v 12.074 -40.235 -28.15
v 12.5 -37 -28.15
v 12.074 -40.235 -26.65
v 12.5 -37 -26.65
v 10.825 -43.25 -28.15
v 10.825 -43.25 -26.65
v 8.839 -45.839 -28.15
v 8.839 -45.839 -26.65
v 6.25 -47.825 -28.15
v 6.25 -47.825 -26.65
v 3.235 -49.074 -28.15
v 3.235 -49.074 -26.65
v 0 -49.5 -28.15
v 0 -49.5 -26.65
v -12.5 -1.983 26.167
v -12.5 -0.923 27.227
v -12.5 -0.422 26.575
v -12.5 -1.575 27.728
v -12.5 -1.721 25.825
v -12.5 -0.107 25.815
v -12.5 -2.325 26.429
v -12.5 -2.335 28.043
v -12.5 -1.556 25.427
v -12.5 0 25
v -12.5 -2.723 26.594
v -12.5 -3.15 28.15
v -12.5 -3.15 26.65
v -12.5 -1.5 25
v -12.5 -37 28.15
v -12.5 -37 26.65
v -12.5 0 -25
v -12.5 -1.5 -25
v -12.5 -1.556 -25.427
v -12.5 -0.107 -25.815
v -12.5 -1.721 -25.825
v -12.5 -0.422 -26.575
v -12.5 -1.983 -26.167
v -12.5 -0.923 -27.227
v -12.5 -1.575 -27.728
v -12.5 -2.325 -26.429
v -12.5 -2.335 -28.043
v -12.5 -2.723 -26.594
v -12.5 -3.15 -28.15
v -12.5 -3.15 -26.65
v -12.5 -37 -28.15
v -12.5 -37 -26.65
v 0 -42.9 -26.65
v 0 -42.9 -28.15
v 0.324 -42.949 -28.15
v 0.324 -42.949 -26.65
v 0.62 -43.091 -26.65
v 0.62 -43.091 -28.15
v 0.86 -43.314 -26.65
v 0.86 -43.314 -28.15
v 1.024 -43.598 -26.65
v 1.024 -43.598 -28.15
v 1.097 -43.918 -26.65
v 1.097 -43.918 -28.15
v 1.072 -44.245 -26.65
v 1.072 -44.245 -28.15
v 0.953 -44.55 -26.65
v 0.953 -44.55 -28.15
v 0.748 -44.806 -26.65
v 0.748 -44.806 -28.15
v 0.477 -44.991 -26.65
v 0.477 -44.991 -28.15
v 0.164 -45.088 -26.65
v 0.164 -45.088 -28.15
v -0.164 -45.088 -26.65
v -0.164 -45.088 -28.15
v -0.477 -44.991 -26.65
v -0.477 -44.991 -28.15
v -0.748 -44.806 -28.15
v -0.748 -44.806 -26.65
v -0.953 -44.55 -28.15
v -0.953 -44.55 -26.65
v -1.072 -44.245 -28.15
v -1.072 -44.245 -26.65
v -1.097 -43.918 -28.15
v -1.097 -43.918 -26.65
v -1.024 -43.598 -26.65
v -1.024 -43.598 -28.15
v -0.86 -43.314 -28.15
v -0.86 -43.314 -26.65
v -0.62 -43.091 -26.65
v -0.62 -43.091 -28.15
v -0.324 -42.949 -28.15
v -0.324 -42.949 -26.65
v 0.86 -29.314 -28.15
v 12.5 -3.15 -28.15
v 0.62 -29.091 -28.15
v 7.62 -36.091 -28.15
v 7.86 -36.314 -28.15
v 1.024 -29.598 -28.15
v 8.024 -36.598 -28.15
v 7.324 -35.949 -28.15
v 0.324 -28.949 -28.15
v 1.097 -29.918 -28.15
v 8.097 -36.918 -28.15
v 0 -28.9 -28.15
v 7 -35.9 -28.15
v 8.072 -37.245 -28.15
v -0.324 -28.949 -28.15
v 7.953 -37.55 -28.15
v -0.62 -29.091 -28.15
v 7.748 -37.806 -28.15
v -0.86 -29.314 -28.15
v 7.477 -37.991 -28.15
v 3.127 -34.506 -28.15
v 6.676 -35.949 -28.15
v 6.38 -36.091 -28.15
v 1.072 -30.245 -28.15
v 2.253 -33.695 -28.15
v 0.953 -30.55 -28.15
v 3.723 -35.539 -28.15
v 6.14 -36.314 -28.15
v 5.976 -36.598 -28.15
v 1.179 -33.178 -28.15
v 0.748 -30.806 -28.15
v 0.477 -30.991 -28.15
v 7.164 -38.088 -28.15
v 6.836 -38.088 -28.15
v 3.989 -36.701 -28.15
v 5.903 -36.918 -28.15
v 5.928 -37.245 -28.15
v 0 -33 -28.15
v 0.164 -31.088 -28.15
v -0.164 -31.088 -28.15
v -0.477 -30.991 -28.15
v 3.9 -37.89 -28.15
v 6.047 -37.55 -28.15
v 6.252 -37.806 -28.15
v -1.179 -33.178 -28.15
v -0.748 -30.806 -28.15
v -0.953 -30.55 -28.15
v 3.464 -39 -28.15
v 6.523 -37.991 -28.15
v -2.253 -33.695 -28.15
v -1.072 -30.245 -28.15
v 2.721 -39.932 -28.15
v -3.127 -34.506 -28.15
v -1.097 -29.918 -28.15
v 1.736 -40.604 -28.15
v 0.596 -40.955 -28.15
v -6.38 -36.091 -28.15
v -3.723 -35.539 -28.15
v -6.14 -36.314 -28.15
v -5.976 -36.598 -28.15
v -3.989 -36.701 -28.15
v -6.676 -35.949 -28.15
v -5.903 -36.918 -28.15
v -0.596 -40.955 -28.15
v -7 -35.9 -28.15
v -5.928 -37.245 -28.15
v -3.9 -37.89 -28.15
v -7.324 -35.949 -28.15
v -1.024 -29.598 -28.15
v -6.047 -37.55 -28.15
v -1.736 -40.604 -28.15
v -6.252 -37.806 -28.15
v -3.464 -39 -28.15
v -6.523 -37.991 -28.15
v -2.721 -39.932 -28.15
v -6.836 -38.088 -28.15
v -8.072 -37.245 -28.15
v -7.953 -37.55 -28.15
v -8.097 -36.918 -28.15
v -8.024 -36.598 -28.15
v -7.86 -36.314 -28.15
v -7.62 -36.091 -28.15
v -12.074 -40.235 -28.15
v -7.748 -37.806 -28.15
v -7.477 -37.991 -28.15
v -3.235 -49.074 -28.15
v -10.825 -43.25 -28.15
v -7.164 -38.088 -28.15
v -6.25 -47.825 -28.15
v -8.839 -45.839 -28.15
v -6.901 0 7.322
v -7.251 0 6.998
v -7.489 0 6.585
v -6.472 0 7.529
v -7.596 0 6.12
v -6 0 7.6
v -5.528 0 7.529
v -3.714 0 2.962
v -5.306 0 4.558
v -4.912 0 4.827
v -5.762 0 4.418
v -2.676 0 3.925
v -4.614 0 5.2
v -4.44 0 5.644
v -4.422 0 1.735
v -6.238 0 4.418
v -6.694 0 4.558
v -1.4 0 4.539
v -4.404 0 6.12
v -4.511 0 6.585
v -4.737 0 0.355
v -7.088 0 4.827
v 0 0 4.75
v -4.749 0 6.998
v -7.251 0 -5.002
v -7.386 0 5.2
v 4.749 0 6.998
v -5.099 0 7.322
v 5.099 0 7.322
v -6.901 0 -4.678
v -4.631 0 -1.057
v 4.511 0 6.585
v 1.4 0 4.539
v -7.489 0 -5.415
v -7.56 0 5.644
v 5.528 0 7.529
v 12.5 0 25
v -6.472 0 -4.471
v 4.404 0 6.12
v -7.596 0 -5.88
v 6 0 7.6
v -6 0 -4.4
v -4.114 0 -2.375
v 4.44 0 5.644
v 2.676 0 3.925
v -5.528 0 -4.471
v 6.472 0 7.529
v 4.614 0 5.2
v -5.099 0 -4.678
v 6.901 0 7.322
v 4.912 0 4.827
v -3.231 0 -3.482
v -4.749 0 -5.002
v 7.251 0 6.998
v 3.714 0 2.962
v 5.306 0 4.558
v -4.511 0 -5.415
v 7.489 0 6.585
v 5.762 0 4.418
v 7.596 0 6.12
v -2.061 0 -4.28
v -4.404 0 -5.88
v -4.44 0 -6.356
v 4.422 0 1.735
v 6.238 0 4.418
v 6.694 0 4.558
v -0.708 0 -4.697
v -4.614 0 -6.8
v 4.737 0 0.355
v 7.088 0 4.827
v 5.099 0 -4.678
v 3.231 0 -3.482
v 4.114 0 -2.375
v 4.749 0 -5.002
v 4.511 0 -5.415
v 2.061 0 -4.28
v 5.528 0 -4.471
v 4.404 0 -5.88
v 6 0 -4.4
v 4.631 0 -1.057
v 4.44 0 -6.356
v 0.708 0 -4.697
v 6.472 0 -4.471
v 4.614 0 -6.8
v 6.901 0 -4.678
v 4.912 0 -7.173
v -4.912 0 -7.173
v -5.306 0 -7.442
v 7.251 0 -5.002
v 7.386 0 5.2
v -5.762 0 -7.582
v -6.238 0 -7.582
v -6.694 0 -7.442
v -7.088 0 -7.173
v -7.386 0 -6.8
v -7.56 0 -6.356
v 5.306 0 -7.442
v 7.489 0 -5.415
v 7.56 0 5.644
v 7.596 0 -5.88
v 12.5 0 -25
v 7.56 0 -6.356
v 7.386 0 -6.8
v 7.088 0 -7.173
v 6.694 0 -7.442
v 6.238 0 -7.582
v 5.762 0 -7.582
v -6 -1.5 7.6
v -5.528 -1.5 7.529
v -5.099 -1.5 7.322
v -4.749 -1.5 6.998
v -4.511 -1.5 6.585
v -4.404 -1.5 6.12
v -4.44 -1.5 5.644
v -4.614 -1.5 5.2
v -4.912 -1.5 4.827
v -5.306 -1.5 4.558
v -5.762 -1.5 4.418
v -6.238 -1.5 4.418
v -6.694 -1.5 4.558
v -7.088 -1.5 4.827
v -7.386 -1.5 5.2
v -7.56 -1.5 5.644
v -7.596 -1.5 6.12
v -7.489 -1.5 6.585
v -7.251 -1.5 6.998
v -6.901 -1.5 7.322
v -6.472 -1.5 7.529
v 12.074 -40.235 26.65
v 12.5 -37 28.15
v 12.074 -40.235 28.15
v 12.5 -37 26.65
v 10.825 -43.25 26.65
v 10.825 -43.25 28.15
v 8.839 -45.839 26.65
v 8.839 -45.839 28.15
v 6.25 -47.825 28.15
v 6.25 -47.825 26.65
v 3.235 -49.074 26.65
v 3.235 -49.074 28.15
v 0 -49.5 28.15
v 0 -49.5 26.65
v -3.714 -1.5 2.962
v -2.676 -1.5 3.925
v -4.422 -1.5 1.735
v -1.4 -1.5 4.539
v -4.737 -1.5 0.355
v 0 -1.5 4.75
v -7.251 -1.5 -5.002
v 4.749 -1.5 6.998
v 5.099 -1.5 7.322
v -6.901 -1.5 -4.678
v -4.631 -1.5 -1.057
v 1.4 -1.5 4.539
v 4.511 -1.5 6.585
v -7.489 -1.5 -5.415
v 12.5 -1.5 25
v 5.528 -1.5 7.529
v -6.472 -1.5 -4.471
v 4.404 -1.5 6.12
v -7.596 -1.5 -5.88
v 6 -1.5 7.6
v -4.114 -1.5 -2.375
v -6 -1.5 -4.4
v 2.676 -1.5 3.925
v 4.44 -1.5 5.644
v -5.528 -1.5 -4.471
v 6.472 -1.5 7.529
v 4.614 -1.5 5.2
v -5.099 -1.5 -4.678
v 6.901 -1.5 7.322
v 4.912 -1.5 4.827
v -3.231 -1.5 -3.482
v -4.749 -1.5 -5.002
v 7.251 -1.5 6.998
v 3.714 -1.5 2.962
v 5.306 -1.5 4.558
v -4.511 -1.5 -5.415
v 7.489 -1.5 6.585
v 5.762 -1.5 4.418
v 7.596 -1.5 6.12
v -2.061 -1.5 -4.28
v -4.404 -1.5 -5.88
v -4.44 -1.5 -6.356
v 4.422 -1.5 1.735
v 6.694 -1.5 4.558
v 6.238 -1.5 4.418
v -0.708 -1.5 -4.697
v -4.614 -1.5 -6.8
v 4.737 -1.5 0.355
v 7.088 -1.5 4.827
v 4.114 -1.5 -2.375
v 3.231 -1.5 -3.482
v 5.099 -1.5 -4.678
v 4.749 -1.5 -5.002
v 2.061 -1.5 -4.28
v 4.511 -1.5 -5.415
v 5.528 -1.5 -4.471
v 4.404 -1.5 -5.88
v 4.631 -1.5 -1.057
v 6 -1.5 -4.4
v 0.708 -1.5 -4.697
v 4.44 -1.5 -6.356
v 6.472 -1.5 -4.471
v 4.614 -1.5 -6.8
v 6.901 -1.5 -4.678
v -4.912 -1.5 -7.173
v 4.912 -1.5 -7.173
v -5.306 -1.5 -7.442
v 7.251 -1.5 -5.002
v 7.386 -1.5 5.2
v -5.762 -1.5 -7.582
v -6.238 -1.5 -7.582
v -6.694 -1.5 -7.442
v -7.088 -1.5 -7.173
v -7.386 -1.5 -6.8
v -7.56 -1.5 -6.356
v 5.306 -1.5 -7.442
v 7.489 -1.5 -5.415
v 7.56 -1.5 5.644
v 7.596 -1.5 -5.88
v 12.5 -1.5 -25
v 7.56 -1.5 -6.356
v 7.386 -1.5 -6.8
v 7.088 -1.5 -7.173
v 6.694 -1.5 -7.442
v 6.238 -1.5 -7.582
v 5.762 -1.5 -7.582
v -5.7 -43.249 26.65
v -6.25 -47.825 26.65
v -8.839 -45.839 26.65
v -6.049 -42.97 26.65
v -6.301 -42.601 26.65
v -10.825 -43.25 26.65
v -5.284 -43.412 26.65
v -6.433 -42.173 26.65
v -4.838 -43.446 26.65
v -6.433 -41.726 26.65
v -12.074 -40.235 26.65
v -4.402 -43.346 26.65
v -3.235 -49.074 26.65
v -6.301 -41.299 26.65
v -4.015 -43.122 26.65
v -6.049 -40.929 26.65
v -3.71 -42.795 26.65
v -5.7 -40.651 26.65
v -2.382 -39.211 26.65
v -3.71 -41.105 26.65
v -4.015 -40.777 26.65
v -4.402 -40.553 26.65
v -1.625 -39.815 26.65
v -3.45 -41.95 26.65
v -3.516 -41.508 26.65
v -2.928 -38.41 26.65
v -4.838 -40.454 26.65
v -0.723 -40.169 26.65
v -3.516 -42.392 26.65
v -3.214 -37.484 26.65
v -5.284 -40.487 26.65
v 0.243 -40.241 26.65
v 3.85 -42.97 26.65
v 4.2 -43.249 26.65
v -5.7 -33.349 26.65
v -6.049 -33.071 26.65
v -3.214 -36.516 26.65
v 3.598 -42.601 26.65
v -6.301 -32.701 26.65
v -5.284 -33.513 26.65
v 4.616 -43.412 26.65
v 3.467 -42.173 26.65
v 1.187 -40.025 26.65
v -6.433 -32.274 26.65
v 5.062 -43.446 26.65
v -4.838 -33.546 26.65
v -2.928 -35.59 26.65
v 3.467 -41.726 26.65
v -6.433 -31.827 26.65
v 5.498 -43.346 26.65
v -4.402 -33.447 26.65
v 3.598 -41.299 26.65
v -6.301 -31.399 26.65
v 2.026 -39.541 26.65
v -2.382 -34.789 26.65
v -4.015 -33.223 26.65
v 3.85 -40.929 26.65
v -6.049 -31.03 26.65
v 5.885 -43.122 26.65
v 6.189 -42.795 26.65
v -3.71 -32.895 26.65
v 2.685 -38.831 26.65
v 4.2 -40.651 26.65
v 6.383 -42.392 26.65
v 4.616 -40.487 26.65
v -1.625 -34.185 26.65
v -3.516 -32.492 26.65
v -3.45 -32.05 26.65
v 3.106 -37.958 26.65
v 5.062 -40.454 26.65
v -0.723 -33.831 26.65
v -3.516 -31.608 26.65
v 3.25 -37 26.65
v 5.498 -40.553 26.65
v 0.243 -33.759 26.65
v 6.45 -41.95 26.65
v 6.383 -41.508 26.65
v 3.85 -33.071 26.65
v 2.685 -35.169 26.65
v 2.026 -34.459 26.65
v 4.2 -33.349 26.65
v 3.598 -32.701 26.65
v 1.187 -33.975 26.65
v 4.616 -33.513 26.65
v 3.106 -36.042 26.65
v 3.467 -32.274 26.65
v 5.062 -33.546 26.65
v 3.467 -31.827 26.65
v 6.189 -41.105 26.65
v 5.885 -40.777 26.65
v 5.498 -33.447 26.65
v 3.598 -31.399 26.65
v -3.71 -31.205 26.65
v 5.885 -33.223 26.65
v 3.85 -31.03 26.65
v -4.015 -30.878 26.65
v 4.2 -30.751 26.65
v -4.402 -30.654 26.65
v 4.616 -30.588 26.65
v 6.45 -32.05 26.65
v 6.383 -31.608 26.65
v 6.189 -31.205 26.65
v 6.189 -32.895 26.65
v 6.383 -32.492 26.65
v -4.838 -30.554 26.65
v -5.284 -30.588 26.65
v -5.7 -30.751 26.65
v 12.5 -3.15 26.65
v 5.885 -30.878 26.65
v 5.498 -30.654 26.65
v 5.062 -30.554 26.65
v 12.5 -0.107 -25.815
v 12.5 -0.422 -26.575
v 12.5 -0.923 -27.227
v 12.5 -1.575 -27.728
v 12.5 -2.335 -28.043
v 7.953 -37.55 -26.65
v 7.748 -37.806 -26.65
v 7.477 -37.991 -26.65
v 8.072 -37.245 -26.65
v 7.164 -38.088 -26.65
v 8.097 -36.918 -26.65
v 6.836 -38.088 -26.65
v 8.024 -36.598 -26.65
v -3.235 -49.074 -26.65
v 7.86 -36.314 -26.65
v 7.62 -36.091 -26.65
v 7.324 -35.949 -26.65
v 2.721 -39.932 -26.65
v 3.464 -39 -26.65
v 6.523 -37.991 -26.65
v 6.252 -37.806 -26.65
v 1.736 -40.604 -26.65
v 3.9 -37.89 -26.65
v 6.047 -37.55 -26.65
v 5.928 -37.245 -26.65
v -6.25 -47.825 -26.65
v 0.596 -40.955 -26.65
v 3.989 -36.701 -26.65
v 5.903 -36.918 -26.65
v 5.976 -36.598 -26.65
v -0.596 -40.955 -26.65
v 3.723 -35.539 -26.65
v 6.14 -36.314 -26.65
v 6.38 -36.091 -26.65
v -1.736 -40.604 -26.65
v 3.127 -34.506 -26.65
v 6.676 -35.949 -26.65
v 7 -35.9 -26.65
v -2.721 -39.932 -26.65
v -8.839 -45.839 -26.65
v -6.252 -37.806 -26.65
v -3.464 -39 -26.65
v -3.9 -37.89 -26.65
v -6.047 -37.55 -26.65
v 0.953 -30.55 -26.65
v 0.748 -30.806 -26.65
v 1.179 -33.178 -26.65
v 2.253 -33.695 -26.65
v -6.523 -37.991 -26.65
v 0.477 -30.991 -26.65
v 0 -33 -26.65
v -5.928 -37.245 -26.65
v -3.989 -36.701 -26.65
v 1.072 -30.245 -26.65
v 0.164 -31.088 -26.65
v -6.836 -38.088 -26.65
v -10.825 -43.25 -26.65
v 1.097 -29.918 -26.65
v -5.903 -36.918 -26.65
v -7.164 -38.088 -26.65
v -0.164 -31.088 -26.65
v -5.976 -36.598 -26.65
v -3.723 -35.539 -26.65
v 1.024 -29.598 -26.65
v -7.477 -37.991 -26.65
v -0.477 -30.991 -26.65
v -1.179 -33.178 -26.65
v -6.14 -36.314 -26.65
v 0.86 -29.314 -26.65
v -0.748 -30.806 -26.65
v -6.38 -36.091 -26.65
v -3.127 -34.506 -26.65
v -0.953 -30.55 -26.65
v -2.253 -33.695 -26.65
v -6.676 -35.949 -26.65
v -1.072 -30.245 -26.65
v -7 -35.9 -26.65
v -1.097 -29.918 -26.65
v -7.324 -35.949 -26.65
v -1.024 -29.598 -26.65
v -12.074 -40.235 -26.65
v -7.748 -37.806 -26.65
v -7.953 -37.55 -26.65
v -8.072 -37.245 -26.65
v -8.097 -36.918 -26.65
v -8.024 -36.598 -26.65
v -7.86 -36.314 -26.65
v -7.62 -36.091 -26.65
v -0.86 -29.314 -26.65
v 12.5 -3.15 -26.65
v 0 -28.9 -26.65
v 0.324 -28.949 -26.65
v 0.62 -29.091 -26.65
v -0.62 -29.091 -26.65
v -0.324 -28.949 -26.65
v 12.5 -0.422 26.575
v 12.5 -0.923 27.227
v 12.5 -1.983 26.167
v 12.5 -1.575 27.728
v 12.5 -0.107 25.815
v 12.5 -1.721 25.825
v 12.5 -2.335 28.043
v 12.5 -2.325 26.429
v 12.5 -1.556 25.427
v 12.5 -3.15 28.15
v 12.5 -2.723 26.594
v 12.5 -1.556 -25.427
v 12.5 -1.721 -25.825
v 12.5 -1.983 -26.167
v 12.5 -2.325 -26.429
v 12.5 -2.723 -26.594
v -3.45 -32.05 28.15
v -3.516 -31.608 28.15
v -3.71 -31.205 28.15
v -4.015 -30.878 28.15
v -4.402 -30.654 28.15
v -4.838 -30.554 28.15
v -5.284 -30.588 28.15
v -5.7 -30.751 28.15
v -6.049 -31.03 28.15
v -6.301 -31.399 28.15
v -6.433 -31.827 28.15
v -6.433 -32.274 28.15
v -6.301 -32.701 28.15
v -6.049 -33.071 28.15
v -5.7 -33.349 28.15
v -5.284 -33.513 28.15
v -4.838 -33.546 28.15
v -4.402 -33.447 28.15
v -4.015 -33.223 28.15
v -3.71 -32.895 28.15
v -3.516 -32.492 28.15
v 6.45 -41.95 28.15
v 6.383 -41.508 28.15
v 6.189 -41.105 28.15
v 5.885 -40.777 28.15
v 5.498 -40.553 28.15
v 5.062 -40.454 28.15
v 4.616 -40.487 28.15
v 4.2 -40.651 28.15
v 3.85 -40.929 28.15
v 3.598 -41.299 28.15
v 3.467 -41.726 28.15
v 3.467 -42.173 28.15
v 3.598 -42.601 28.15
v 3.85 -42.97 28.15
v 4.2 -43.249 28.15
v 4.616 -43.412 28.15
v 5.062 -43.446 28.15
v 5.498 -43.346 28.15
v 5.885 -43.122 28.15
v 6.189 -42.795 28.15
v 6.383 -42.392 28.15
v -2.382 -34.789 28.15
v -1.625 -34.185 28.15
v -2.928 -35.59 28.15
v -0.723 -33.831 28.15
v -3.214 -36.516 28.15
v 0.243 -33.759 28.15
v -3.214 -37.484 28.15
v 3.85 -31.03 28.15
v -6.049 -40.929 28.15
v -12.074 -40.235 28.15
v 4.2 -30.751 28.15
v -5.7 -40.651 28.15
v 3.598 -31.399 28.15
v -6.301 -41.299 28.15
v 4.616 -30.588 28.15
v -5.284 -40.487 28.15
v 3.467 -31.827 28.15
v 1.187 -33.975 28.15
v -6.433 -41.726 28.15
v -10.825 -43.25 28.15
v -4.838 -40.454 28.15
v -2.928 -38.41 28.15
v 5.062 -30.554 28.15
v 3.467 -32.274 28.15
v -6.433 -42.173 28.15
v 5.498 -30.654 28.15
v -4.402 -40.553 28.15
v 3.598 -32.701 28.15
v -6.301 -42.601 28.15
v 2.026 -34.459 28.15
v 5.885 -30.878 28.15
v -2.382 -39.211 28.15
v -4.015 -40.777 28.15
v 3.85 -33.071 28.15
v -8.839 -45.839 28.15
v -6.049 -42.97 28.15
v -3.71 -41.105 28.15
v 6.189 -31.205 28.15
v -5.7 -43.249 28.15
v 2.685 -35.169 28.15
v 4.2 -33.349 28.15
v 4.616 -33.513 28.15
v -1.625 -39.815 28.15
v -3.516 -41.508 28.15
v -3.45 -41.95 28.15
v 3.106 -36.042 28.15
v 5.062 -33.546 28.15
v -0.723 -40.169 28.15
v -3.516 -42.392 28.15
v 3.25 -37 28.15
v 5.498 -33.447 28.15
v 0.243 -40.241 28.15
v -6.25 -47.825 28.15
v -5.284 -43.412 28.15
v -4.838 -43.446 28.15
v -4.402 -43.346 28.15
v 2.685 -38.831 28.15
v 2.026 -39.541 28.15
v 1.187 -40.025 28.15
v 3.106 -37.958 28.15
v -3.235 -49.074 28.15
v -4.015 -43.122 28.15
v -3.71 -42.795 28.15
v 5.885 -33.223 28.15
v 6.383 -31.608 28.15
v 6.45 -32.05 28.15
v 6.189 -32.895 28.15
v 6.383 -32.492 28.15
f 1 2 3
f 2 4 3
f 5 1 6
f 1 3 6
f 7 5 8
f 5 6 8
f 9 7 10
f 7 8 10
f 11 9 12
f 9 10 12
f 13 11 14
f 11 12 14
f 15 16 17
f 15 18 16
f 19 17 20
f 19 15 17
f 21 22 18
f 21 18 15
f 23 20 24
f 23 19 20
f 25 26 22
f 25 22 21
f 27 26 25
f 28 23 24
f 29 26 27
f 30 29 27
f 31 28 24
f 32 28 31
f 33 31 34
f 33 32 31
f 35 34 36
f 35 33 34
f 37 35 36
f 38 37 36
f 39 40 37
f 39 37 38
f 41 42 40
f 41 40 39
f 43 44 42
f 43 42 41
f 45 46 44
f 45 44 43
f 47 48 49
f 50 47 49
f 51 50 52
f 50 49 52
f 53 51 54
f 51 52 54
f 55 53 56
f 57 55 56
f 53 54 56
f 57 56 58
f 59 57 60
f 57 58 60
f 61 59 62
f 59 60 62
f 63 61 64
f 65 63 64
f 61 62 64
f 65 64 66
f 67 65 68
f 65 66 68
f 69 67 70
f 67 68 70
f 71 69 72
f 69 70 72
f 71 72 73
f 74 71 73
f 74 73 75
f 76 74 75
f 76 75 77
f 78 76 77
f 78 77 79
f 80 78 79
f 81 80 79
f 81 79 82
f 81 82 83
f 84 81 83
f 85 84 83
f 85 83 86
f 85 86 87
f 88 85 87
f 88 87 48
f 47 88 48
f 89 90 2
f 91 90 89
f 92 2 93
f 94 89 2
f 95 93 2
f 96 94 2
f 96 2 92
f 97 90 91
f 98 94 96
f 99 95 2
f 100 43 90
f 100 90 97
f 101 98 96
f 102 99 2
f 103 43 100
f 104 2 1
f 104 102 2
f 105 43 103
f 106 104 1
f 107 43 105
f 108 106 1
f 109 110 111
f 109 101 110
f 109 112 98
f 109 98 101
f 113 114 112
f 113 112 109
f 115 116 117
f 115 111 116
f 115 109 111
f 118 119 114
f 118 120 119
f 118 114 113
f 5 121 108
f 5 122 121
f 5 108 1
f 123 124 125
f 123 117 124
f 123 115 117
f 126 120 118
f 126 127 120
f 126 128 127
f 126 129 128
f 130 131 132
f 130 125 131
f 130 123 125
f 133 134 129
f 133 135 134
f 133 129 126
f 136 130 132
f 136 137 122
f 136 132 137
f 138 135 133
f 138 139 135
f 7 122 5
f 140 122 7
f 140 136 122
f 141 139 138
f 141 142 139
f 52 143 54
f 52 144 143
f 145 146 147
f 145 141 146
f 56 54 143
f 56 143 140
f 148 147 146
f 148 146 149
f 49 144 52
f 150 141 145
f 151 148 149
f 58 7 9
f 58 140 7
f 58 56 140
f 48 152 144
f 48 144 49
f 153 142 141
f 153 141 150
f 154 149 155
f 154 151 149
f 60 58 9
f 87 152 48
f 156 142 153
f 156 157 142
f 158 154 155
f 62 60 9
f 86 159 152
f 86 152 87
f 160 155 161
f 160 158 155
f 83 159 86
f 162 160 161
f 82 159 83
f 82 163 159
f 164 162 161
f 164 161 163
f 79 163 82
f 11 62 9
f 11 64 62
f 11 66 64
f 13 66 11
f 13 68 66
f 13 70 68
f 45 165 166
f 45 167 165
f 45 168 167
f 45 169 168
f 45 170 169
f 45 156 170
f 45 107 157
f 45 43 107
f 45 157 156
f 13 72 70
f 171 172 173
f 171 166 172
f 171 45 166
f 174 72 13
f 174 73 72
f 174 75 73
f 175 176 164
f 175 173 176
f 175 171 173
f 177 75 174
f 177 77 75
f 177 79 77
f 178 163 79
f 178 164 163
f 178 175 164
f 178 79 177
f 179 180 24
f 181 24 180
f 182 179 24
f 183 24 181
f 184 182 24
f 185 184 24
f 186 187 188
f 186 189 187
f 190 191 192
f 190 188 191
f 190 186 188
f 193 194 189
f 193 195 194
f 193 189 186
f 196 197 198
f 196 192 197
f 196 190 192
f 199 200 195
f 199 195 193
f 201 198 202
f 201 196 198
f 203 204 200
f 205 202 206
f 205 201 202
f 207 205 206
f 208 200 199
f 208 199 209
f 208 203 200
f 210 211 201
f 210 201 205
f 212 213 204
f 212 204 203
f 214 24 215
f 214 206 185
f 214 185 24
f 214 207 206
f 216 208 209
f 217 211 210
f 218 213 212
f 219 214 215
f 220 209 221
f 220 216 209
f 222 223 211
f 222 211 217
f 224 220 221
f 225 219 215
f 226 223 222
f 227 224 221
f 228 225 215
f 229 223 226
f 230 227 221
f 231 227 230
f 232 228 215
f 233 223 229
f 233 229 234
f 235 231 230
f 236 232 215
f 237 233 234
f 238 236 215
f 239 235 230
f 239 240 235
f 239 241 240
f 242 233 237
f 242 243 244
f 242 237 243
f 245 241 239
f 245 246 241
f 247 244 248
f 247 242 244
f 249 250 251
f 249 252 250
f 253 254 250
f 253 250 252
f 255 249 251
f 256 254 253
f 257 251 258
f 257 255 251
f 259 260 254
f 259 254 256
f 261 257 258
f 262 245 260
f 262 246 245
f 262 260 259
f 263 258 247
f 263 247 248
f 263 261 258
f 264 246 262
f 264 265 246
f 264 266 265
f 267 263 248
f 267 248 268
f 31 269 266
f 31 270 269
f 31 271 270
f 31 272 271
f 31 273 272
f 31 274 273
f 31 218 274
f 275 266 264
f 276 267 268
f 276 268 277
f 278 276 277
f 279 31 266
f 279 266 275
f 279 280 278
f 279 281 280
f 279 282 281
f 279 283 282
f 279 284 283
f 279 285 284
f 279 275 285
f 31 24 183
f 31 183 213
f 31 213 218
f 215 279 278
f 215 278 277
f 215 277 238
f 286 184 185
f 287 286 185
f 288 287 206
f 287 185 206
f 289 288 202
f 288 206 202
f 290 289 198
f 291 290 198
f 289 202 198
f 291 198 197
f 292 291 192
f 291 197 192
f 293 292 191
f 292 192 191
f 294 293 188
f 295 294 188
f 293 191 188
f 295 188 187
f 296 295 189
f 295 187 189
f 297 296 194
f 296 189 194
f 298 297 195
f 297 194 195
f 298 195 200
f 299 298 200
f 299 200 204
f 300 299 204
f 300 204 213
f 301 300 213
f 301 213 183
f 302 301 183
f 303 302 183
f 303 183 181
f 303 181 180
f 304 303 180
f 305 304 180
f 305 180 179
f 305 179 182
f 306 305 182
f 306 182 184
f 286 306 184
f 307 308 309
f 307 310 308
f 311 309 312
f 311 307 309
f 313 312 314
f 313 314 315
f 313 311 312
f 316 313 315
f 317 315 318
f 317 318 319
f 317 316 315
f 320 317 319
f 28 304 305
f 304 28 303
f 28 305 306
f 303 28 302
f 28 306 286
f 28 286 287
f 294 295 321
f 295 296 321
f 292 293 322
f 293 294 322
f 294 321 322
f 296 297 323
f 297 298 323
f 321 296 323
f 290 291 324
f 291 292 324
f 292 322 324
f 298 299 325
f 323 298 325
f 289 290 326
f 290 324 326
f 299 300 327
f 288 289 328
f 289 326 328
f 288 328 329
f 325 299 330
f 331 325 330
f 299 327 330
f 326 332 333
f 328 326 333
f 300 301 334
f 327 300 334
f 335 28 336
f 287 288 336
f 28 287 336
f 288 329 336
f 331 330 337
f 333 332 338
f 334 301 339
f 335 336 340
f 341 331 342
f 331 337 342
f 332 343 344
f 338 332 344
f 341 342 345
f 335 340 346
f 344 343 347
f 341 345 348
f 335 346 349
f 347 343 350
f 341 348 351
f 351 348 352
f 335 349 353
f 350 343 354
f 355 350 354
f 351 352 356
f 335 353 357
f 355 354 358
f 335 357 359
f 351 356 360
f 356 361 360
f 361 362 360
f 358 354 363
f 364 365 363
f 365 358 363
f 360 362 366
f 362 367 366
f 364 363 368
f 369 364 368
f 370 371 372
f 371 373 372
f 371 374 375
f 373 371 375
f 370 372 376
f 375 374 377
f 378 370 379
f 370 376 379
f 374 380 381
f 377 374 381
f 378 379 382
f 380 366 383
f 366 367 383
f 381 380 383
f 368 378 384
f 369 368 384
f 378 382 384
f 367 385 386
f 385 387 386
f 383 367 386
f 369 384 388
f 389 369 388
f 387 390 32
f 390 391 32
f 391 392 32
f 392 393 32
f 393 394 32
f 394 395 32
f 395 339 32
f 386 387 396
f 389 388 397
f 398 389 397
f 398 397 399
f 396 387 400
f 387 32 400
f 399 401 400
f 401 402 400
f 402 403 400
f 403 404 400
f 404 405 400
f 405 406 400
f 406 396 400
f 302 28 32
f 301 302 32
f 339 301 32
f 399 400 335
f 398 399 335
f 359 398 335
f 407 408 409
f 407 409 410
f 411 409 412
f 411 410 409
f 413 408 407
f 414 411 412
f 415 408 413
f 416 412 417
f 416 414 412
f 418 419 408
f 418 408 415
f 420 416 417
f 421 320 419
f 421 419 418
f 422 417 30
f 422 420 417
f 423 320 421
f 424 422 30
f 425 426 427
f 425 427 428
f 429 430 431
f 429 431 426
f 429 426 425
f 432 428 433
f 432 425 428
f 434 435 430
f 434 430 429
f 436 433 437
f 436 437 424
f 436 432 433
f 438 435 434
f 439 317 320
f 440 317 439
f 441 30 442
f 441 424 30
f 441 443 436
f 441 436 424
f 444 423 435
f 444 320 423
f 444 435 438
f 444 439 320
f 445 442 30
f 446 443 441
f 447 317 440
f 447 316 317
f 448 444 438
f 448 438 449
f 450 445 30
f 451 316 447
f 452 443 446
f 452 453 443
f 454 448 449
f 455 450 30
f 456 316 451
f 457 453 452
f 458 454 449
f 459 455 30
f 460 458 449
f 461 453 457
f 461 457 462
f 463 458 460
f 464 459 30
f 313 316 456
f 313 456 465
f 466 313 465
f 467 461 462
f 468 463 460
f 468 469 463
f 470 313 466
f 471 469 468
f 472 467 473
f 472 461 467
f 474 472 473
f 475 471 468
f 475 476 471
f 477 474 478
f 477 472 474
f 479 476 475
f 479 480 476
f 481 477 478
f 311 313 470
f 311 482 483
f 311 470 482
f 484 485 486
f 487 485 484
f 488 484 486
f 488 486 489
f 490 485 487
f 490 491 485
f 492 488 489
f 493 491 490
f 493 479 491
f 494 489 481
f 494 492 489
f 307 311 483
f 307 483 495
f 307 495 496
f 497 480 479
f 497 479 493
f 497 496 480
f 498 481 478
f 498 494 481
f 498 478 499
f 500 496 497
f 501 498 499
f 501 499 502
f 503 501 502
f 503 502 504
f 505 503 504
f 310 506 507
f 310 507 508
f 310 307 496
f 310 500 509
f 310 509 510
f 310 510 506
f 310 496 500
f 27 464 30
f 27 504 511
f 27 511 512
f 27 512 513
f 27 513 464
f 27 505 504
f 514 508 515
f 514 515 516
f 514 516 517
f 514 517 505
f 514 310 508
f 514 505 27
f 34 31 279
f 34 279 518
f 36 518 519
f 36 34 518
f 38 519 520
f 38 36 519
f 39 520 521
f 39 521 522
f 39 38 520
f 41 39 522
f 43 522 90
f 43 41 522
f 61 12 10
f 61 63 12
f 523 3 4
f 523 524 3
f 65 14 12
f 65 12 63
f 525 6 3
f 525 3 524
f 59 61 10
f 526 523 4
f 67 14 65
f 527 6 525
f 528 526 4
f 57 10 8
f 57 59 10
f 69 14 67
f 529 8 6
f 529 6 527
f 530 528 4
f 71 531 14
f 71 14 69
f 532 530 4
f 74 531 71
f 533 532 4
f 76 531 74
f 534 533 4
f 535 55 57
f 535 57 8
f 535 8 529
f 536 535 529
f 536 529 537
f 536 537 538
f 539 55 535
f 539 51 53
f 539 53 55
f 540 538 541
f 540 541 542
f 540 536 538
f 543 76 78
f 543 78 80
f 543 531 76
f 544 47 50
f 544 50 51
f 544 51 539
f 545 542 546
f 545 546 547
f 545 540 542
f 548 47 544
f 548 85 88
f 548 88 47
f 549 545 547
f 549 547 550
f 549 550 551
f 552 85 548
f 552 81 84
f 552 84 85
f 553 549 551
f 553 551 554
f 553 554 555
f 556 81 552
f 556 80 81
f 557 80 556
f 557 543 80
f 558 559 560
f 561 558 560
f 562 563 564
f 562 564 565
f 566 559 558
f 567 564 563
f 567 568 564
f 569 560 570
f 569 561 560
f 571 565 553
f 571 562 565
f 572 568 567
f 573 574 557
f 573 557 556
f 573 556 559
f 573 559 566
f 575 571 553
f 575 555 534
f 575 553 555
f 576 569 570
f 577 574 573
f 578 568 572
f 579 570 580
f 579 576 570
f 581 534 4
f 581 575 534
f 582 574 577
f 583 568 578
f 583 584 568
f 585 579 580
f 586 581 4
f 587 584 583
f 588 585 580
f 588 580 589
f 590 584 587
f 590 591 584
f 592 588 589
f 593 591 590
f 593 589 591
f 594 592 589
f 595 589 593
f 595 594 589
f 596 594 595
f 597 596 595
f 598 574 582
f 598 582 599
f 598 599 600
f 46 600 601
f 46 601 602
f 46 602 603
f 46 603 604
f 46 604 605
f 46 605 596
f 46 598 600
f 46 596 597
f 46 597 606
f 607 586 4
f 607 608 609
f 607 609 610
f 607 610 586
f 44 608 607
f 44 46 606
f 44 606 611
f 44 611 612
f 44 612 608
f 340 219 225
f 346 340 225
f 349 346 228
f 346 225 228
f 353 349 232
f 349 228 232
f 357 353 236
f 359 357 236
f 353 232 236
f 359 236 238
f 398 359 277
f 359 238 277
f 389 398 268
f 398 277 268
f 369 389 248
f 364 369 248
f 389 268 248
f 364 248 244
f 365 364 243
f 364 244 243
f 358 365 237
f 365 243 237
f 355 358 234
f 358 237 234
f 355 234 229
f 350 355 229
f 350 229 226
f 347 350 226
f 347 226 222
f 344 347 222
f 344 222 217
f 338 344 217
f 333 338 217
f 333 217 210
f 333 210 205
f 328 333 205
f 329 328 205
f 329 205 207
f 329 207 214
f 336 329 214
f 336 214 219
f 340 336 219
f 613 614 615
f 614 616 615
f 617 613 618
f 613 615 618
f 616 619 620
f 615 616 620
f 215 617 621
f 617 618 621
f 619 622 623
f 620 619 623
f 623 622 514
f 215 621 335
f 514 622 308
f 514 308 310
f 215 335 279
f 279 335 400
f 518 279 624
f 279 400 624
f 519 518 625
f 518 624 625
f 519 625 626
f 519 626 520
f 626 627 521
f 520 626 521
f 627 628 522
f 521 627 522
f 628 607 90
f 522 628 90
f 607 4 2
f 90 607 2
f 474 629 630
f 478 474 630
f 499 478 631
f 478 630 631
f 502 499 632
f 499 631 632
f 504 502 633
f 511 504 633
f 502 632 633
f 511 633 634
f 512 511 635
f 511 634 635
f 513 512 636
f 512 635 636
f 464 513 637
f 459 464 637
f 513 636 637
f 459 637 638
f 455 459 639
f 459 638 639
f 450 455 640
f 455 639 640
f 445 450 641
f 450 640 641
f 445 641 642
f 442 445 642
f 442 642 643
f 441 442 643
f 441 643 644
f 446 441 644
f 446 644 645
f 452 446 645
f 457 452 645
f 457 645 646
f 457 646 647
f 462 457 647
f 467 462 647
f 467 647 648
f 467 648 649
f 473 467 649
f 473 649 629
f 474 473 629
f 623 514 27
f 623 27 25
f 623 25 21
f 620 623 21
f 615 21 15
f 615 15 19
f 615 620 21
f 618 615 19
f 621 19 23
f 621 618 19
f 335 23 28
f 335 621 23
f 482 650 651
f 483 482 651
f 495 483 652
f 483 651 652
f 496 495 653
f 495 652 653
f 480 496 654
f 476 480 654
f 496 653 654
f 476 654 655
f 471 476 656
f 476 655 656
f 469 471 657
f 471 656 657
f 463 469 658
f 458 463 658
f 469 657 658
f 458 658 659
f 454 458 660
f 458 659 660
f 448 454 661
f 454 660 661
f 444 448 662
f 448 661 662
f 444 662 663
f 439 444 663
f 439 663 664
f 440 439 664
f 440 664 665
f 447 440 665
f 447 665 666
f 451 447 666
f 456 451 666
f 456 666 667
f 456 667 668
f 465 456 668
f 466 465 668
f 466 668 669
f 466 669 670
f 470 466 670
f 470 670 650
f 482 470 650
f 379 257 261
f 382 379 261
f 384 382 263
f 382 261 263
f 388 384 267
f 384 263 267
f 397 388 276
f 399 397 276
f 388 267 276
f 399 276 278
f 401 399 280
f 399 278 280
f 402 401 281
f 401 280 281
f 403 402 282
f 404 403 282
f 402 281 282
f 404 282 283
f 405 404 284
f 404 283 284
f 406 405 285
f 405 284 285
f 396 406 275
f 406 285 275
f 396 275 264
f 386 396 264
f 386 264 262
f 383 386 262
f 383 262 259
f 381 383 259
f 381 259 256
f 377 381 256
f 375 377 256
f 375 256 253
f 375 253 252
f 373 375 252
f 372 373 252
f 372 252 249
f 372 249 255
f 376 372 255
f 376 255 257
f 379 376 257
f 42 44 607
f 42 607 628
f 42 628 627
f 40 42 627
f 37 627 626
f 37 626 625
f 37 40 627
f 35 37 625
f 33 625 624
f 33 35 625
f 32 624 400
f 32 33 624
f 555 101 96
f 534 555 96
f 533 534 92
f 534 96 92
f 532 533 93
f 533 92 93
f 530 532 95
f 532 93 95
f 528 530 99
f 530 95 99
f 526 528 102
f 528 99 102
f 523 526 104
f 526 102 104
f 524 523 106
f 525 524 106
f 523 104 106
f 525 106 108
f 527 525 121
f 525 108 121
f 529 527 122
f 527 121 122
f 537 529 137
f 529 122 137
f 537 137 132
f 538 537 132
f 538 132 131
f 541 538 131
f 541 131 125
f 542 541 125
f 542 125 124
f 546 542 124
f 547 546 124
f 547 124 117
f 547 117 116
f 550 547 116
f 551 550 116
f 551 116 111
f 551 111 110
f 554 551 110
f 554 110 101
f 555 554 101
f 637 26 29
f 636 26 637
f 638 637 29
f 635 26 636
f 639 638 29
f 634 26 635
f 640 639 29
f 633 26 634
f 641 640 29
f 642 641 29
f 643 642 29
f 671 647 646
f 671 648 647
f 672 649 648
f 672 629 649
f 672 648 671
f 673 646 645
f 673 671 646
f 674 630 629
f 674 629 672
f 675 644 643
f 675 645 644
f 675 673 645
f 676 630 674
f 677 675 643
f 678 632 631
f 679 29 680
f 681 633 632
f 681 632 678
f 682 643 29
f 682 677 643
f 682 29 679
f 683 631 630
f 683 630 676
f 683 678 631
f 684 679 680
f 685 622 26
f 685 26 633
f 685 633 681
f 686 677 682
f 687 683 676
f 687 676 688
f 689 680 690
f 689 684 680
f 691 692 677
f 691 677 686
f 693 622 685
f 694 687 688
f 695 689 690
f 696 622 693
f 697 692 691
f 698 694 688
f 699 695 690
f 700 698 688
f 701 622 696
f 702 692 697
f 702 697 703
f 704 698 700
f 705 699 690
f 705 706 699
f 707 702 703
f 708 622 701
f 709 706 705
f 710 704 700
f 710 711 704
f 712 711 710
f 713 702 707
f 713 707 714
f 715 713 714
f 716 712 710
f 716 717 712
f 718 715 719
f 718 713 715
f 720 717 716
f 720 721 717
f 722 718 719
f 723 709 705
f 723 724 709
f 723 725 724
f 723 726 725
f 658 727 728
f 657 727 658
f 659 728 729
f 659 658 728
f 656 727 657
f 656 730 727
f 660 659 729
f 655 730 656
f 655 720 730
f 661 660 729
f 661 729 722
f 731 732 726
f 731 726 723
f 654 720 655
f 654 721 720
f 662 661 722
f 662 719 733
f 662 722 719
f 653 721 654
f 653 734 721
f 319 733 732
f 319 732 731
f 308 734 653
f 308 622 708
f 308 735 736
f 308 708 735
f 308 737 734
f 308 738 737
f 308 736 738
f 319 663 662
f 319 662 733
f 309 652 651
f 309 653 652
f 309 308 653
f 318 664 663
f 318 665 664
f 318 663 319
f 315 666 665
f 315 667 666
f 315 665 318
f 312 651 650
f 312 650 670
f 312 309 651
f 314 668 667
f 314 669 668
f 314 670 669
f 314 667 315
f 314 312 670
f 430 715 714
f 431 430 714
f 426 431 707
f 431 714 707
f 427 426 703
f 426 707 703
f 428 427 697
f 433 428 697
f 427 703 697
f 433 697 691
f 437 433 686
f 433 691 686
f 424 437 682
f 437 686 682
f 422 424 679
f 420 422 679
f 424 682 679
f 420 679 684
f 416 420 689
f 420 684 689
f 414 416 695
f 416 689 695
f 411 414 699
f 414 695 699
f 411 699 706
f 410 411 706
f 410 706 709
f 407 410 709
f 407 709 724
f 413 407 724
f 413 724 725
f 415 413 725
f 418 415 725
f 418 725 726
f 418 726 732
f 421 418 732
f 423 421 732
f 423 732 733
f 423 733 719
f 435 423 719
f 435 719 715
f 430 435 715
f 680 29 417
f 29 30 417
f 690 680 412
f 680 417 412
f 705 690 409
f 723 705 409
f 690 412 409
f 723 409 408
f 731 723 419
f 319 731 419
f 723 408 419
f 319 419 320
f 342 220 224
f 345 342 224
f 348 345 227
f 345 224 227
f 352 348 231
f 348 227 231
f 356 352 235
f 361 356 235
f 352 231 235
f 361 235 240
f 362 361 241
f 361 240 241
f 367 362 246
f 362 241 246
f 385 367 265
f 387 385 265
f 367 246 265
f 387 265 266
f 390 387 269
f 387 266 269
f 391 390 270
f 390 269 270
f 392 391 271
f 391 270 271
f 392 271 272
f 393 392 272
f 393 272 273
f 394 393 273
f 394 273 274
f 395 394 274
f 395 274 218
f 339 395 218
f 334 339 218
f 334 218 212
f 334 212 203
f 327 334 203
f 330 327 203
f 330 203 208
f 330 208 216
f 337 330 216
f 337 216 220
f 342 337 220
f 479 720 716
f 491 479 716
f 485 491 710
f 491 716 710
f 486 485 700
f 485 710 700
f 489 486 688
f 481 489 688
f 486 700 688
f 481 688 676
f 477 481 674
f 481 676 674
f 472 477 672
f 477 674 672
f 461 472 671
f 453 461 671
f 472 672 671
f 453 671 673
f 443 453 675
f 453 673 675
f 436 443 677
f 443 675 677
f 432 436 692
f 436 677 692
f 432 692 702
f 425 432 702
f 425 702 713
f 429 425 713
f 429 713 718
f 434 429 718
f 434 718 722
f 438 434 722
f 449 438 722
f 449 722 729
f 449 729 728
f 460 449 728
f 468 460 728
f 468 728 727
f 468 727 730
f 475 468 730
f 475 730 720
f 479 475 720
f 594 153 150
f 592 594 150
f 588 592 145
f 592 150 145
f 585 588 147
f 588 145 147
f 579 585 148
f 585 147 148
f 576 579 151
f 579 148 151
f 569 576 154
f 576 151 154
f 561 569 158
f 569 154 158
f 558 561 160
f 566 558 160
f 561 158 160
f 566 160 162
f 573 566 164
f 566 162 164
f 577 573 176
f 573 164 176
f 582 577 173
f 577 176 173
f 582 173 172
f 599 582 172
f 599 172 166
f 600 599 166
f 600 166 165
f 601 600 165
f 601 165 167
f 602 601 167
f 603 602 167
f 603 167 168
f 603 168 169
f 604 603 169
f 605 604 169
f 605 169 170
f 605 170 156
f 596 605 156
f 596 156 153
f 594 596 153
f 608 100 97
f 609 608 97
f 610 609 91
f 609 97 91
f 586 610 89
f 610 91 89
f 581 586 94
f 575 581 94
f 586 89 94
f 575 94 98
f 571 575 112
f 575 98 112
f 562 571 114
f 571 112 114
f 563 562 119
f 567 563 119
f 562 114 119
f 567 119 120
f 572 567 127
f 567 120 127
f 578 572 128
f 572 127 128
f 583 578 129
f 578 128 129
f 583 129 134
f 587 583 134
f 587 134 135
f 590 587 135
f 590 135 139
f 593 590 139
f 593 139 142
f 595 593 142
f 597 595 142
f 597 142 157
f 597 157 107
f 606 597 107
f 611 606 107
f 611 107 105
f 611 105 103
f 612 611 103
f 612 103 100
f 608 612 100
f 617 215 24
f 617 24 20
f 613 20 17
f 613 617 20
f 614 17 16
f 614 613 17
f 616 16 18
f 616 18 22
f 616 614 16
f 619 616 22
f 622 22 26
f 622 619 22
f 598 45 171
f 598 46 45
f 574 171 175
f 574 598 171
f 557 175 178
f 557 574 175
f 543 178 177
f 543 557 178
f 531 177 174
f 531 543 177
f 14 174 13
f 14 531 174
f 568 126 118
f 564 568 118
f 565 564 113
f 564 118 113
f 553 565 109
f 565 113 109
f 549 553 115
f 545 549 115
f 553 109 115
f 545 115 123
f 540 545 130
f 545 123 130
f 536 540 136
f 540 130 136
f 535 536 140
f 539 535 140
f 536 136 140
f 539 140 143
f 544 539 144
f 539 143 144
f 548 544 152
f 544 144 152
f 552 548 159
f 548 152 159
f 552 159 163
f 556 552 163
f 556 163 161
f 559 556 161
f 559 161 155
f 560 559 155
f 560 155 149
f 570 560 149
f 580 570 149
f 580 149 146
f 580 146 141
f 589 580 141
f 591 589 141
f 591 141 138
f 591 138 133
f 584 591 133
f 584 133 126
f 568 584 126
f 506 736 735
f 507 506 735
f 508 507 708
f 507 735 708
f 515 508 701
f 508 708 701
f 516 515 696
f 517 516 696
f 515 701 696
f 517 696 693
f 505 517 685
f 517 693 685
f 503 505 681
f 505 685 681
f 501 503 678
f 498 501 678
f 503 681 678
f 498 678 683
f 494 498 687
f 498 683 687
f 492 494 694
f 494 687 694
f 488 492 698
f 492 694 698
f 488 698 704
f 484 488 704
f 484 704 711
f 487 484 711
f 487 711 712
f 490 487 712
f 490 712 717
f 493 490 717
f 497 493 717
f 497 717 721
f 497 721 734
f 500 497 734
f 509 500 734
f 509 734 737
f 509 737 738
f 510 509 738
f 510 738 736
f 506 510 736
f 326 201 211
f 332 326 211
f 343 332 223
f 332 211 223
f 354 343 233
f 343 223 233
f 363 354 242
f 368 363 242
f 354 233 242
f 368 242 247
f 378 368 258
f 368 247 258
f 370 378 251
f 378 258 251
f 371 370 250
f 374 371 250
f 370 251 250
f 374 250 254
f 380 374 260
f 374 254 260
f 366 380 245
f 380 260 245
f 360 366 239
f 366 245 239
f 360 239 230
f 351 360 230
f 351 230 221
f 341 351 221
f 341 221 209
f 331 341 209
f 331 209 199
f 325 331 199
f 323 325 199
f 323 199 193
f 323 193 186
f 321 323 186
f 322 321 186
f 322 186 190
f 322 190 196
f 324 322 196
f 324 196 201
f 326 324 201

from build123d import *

# Parameters (mm, degrees)
SKETCH1_W                      = 25
SKETCH1_H                      = 53.3
BASE_FLANGE1_DEPTH             = 1.5
EDGE_FLANGE1_STRIP_W           = 9.3
EDGE_FLANGE1_STRIP_H           = 1.5
EDGE_FLANGE1_STRIP_CUT_DEPTH   = 25
EDGE_FLANGE1_STRIP_2_W         = 9.3
EDGE_FLANGE1_STRIP_2_H         = 1.5
EDGE_FLANGE1_STRIP_CUT_2_DEPTH = 25
EDGE_FLANGE1_DEPTH             = 25
EDGE_FLANGE1_BEND_DEPTH        = 25
CUT_EXTRUDE1_REACH             = 78.001
SKETCH12_R                     = 1.5
SKETCH12_R_2                   = 3.25
CUT_EXTRUDE2_REACH             = 78.001
SKETCH13_R                     = 4
SKETCH13_R_2                   = 1.1
FILLET1_R                      = 12.5
SKETCH17_R                     = 1.6
CUT_EXTRUDE3_DEPTH             = 59.30027873
SKETCH18_R                     = 4.75
CUT_EXTRUDE4_DEPTH             = 59.30027873


# Sheet-metal steps are written as plain solids
with BuildPart() as part:
    # Sketch1 → Base-Flange1 (new body)
    with BuildSketch(Plane(origin=(0, 0, 0), x_dir=(1, 0, 0), z_dir=(0, 1, 0))):
        Rectangle(SKETCH1_W, SKETCH1_H)
    extrude(amount=-BASE_FLANGE1_DEPTH)

    # Edge-Flange1 strip (across the edge) → Edge-Flange1 strip cut (cut)
    with BuildSketch(Plane(origin=(12.5, -1.5, 26.65), x_dir=(0, 0, -1), z_dir=(-1, 0, 0))):
        with Locations((-3, -0.75)):
            Rectangle(EDGE_FLANGE1_STRIP_W, EDGE_FLANGE1_STRIP_H)
    extrude(amount=EDGE_FLANGE1_STRIP_CUT_DEPTH, mode=Mode.SUBTRACT)

    # Edge-Flange1 strip 2 (across the edge) → Edge-Flange1 strip cut 2 (cut)
    with BuildSketch(Plane(origin=(-12.5, -1.5, -26.65), x_dir=(0, 0, 1), z_dir=(1, 0, 0))):
        with Locations((-3, -0.75)):
            Rectangle(EDGE_FLANGE1_STRIP_2_W, EDGE_FLANGE1_STRIP_2_H)
    extrude(amount=EDGE_FLANGE1_STRIP_CUT_2_DEPTH, mode=Mode.SUBTRACT)

    # Edge-Flange1 section (across the edge) → Edge-Flange1 (add)
    with BuildSketch(Plane(origin=(12.5, -1.5, 26.65), x_dir=(0, 0, -1), z_dir=(-1, 0, 0))):
        with BuildLine():
            Line((-1.5, 1.65), (-1.5, 48))
            Line((-1.5, 48), (0, 48))
            Line((0, 48), (0, 1.65))
            ThreePointArc((0, 1.65), (0.483273811, 0.483273811), (1.65, 0))
            Line((1.65, 0), (1.65, -1.5))
            ThreePointArc((1.65, -1.5), (-0.577386361, -0.577386361), (-1.5, 1.65))
        make_face()
    extrude(amount=EDGE_FLANGE1_DEPTH)

    # Edge-Flange1 section 2 (across the edge) → Edge-Flange1 bend (add)
    with BuildSketch(Plane(origin=(-12.5, -1.5, -26.65), x_dir=(0, 0, 1), z_dir=(1, 0, 0))):
        with BuildLine():
            Line((-1.5, 1.65), (-1.5, 48))
            Line((-1.5, 48), (0, 48))
            Line((0, 48), (0, 1.65))
            ThreePointArc((0, 1.65), (0.483273811, 0.483273811), (1.65, 0))
            Line((1.65, 0), (1.65, -1.5))
            ThreePointArc((1.65, -1.5), (-0.577386361, -0.577386361), (-1.5, 1.65))
        make_face()
    extrude(amount=EDGE_FLANGE1_BEND_DEPTH)

    # Sketch12 → Cut-Extrude1 (cut, up to next)
    with BuildSketch(Plane.XY.offset(28.15), mode=Mode.PRIVATE) as cut_extrude1_sk1:
        with Locations((-4.949747468, -32.050252532)):
            Circle(SKETCH12_R)
    cut_extrude1_tool1 = extrude(cut_extrude1_sk1.sketch, amount=-CUT_EXTRUDE1_REACH, mode=Mode.PRIVATE) & part.part
    # Sketch12 → Cut-Extrude1 (cut, up to next)
    with BuildSketch(Plane.XY.offset(28.15), mode=Mode.PRIVATE) as cut_extrude1_sk2:
        with Locations((4.949747468, -32.050252532)):
            Circle(SKETCH12_R)
    cut_extrude1_tool2 = extrude(cut_extrude1_sk2.sketch, amount=-CUT_EXTRUDE1_REACH, mode=Mode.PRIVATE) & part.part
    # Sketch12 → Cut-Extrude1 (cut, up to next)
    with BuildSketch(Plane.XY.offset(28.15), mode=Mode.PRIVATE) as cut_extrude1_sk3:
        with Locations((-4.949747468, -41.949747468)):
            Circle(SKETCH12_R)
    cut_extrude1_tool3 = extrude(cut_extrude1_sk3.sketch, amount=-CUT_EXTRUDE1_REACH, mode=Mode.PRIVATE) & part.part
    # Sketch12 → Cut-Extrude1 (cut, up to next)
    with BuildSketch(Plane.XY.offset(28.15), mode=Mode.PRIVATE) as cut_extrude1_sk4:
        with Locations((4.949747468, -41.949747468)):
            Circle(SKETCH12_R)
    cut_extrude1_tool4 = extrude(cut_extrude1_sk4.sketch, amount=-CUT_EXTRUDE1_REACH, mode=Mode.PRIVATE) & part.part
    # Sketch12 → Cut-Extrude1 (cut, up to next)
    with BuildSketch(Plane.XY.offset(28.15), mode=Mode.PRIVATE) as cut_extrude1_sk5:
        with Locations((0, -37)):
            Circle(SKETCH12_R_2)
    cut_extrude1_tool5 = extrude(cut_extrude1_sk5.sketch, amount=-CUT_EXTRUDE1_REACH, mode=Mode.PRIVATE) & part.part
    add(cut_extrude1_tool1.solids().sort_by_distance((-4.949747, -32.050253, 28.15))[0], mode=Mode.SUBTRACT)
    add(cut_extrude1_tool2.solids().sort_by_distance((4.949747, -32.050253, 28.15))[0], mode=Mode.SUBTRACT)
    add(cut_extrude1_tool3.solids().sort_by_distance((-4.949747, -41.949747, 28.15))[0], mode=Mode.SUBTRACT)
    add(cut_extrude1_tool4.solids().sort_by_distance((4.949747, -41.949747, 28.15))[0], mode=Mode.SUBTRACT)
    add(cut_extrude1_tool5.solids().sort_by_distance((0, -37, 28.15))[0], mode=Mode.SUBTRACT)

    # Sketch13 → Cut-Extrude2 (cut, up to next)
    with BuildSketch(Plane(origin=(0, 0, -28.15), x_dir=(-1, 0, 0), z_dir=(0, 0, -1)), mode=Mode.PRIVATE) as cut_extrude2_sk1:
        with Locations(Location((0, -37, 0), (0, 0, 90))):
            Circle(SKETCH13_R)
    cut_extrude2_tool1 = extrude(cut_extrude2_sk1.sketch, amount=-CUT_EXTRUDE2_REACH, mode=Mode.PRIVATE) & part.part
    # Sketch13 → Cut-Extrude2 (cut, up to next)
    with BuildSketch(Plane(origin=(0, 0, -28.15), x_dir=(-1, 0, 0), z_dir=(0, 0, -1)), mode=Mode.PRIVATE) as cut_extrude2_sk2:
        with Locations(Location((0, -44, 0), (0, 0, 90))):
            Circle(SKETCH13_R_2)
    cut_extrude2_tool2 = extrude(cut_extrude2_sk2.sketch, amount=-CUT_EXTRUDE2_REACH, mode=Mode.PRIVATE) & part.part
    # Sketch13 → Cut-Extrude2 (cut, up to next)
    with BuildSketch(Plane(origin=(0, 0, -28.15), x_dir=(-1, 0, 0), z_dir=(0, 0, -1)), mode=Mode.PRIVATE) as cut_extrude2_sk3:
        with Locations(Location((-7, -37, 0), (0, 0, 90))):
            Circle(SKETCH13_R_2)
    cut_extrude2_tool3 = extrude(cut_extrude2_sk3.sketch, amount=-CUT_EXTRUDE2_REACH, mode=Mode.PRIVATE) & part.part
    # Sketch13 → Cut-Extrude2 (cut, up to next)
    with BuildSketch(Plane(origin=(0, 0, -28.15), x_dir=(-1, 0, 0), z_dir=(0, 0, -1)), mode=Mode.PRIVATE) as cut_extrude2_sk4:
        with Locations(Location((0, -30, 0), (0, 0, 90))):
            Circle(SKETCH13_R_2)
    cut_extrude2_tool4 = extrude(cut_extrude2_sk4.sketch, amount=-CUT_EXTRUDE2_REACH, mode=Mode.PRIVATE) & part.part
    # Sketch13 → Cut-Extrude2 (cut, up to next)
    with BuildSketch(Plane(origin=(0, 0, -28.15), x_dir=(-1, 0, 0), z_dir=(0, 0, -1)), mode=Mode.PRIVATE) as cut_extrude2_sk5:
        with Locations(Location((7, -37, 0), (0, 0, 90))):
            Circle(SKETCH13_R_2)
    cut_extrude2_tool5 = extrude(cut_extrude2_sk5.sketch, amount=-CUT_EXTRUDE2_REACH, mode=Mode.PRIVATE) & part.part
    add(cut_extrude2_tool1.solids().sort_by_distance((0, -37, -28.15))[0], mode=Mode.SUBTRACT)
    add(cut_extrude2_tool2.solids().sort_by_distance((0, -44, -28.15))[0], mode=Mode.SUBTRACT)
    add(cut_extrude2_tool3.solids().sort_by_distance((7, -37, -28.15))[0], mode=Mode.SUBTRACT)
    add(cut_extrude2_tool4.solids().sort_by_distance((0, -30, -28.15))[0], mode=Mode.SUBTRACT)
    add(cut_extrude2_tool5.solids().sort_by_distance((-7, -37, -28.15))[0], mode=Mode.SUBTRACT)

    # Fillet1
    fillet1_edges = [part.edges().sort_by_distance(p)[0] for p in [
        (12.5, -49.5, 27.4),
        (-12.5, -49.5, 27.4),
        (-12.5, -49.5, -27.4),
        (12.5, -49.5, -27.4),
    ]]
    fillet(fillet1_edges, radius=FILLET1_R - 0.0001)  # a hair under: the kernel refuses the full size

    # Sketch17 → Cut-Extrude3 (cut, through all)
    with BuildSketch(Plane(origin=(0, 0, 0), x_dir=(1, 0, 0), z_dir=(0, 1, 0))):
        with Locations(Location((-6, 6, 0), (0, 0, 270))):
            Circle(SKETCH17_R)
        with Locations(Location((6, 6, 0), (0, 0, 270))):
            Circle(SKETCH17_R)
        with Locations(Location((6, -6, 0), (0, 0, 270))):
            Circle(SKETCH17_R)
        with Locations(Location((-6, -6, 0), (0, 0, 270))):
            Circle(SKETCH17_R)
    extrude(amount=-CUT_EXTRUDE3_DEPTH, mode=Mode.SUBTRACT)

    # Sketch18 → Cut-Extrude4 (cut, through all)
    with BuildSketch(Plane(origin=(0, 0, 0), x_dir=(1, 0, 0), z_dir=(0, 1, 0))):
        with Locations(Location((0, 0, 0), (0, 0, 270))):
            Circle(SKETCH18_R)
    extrude(amount=-CUT_EXTRUDE4_DEPTH, mode=Mode.SUBTRACT)


solid = part.part
